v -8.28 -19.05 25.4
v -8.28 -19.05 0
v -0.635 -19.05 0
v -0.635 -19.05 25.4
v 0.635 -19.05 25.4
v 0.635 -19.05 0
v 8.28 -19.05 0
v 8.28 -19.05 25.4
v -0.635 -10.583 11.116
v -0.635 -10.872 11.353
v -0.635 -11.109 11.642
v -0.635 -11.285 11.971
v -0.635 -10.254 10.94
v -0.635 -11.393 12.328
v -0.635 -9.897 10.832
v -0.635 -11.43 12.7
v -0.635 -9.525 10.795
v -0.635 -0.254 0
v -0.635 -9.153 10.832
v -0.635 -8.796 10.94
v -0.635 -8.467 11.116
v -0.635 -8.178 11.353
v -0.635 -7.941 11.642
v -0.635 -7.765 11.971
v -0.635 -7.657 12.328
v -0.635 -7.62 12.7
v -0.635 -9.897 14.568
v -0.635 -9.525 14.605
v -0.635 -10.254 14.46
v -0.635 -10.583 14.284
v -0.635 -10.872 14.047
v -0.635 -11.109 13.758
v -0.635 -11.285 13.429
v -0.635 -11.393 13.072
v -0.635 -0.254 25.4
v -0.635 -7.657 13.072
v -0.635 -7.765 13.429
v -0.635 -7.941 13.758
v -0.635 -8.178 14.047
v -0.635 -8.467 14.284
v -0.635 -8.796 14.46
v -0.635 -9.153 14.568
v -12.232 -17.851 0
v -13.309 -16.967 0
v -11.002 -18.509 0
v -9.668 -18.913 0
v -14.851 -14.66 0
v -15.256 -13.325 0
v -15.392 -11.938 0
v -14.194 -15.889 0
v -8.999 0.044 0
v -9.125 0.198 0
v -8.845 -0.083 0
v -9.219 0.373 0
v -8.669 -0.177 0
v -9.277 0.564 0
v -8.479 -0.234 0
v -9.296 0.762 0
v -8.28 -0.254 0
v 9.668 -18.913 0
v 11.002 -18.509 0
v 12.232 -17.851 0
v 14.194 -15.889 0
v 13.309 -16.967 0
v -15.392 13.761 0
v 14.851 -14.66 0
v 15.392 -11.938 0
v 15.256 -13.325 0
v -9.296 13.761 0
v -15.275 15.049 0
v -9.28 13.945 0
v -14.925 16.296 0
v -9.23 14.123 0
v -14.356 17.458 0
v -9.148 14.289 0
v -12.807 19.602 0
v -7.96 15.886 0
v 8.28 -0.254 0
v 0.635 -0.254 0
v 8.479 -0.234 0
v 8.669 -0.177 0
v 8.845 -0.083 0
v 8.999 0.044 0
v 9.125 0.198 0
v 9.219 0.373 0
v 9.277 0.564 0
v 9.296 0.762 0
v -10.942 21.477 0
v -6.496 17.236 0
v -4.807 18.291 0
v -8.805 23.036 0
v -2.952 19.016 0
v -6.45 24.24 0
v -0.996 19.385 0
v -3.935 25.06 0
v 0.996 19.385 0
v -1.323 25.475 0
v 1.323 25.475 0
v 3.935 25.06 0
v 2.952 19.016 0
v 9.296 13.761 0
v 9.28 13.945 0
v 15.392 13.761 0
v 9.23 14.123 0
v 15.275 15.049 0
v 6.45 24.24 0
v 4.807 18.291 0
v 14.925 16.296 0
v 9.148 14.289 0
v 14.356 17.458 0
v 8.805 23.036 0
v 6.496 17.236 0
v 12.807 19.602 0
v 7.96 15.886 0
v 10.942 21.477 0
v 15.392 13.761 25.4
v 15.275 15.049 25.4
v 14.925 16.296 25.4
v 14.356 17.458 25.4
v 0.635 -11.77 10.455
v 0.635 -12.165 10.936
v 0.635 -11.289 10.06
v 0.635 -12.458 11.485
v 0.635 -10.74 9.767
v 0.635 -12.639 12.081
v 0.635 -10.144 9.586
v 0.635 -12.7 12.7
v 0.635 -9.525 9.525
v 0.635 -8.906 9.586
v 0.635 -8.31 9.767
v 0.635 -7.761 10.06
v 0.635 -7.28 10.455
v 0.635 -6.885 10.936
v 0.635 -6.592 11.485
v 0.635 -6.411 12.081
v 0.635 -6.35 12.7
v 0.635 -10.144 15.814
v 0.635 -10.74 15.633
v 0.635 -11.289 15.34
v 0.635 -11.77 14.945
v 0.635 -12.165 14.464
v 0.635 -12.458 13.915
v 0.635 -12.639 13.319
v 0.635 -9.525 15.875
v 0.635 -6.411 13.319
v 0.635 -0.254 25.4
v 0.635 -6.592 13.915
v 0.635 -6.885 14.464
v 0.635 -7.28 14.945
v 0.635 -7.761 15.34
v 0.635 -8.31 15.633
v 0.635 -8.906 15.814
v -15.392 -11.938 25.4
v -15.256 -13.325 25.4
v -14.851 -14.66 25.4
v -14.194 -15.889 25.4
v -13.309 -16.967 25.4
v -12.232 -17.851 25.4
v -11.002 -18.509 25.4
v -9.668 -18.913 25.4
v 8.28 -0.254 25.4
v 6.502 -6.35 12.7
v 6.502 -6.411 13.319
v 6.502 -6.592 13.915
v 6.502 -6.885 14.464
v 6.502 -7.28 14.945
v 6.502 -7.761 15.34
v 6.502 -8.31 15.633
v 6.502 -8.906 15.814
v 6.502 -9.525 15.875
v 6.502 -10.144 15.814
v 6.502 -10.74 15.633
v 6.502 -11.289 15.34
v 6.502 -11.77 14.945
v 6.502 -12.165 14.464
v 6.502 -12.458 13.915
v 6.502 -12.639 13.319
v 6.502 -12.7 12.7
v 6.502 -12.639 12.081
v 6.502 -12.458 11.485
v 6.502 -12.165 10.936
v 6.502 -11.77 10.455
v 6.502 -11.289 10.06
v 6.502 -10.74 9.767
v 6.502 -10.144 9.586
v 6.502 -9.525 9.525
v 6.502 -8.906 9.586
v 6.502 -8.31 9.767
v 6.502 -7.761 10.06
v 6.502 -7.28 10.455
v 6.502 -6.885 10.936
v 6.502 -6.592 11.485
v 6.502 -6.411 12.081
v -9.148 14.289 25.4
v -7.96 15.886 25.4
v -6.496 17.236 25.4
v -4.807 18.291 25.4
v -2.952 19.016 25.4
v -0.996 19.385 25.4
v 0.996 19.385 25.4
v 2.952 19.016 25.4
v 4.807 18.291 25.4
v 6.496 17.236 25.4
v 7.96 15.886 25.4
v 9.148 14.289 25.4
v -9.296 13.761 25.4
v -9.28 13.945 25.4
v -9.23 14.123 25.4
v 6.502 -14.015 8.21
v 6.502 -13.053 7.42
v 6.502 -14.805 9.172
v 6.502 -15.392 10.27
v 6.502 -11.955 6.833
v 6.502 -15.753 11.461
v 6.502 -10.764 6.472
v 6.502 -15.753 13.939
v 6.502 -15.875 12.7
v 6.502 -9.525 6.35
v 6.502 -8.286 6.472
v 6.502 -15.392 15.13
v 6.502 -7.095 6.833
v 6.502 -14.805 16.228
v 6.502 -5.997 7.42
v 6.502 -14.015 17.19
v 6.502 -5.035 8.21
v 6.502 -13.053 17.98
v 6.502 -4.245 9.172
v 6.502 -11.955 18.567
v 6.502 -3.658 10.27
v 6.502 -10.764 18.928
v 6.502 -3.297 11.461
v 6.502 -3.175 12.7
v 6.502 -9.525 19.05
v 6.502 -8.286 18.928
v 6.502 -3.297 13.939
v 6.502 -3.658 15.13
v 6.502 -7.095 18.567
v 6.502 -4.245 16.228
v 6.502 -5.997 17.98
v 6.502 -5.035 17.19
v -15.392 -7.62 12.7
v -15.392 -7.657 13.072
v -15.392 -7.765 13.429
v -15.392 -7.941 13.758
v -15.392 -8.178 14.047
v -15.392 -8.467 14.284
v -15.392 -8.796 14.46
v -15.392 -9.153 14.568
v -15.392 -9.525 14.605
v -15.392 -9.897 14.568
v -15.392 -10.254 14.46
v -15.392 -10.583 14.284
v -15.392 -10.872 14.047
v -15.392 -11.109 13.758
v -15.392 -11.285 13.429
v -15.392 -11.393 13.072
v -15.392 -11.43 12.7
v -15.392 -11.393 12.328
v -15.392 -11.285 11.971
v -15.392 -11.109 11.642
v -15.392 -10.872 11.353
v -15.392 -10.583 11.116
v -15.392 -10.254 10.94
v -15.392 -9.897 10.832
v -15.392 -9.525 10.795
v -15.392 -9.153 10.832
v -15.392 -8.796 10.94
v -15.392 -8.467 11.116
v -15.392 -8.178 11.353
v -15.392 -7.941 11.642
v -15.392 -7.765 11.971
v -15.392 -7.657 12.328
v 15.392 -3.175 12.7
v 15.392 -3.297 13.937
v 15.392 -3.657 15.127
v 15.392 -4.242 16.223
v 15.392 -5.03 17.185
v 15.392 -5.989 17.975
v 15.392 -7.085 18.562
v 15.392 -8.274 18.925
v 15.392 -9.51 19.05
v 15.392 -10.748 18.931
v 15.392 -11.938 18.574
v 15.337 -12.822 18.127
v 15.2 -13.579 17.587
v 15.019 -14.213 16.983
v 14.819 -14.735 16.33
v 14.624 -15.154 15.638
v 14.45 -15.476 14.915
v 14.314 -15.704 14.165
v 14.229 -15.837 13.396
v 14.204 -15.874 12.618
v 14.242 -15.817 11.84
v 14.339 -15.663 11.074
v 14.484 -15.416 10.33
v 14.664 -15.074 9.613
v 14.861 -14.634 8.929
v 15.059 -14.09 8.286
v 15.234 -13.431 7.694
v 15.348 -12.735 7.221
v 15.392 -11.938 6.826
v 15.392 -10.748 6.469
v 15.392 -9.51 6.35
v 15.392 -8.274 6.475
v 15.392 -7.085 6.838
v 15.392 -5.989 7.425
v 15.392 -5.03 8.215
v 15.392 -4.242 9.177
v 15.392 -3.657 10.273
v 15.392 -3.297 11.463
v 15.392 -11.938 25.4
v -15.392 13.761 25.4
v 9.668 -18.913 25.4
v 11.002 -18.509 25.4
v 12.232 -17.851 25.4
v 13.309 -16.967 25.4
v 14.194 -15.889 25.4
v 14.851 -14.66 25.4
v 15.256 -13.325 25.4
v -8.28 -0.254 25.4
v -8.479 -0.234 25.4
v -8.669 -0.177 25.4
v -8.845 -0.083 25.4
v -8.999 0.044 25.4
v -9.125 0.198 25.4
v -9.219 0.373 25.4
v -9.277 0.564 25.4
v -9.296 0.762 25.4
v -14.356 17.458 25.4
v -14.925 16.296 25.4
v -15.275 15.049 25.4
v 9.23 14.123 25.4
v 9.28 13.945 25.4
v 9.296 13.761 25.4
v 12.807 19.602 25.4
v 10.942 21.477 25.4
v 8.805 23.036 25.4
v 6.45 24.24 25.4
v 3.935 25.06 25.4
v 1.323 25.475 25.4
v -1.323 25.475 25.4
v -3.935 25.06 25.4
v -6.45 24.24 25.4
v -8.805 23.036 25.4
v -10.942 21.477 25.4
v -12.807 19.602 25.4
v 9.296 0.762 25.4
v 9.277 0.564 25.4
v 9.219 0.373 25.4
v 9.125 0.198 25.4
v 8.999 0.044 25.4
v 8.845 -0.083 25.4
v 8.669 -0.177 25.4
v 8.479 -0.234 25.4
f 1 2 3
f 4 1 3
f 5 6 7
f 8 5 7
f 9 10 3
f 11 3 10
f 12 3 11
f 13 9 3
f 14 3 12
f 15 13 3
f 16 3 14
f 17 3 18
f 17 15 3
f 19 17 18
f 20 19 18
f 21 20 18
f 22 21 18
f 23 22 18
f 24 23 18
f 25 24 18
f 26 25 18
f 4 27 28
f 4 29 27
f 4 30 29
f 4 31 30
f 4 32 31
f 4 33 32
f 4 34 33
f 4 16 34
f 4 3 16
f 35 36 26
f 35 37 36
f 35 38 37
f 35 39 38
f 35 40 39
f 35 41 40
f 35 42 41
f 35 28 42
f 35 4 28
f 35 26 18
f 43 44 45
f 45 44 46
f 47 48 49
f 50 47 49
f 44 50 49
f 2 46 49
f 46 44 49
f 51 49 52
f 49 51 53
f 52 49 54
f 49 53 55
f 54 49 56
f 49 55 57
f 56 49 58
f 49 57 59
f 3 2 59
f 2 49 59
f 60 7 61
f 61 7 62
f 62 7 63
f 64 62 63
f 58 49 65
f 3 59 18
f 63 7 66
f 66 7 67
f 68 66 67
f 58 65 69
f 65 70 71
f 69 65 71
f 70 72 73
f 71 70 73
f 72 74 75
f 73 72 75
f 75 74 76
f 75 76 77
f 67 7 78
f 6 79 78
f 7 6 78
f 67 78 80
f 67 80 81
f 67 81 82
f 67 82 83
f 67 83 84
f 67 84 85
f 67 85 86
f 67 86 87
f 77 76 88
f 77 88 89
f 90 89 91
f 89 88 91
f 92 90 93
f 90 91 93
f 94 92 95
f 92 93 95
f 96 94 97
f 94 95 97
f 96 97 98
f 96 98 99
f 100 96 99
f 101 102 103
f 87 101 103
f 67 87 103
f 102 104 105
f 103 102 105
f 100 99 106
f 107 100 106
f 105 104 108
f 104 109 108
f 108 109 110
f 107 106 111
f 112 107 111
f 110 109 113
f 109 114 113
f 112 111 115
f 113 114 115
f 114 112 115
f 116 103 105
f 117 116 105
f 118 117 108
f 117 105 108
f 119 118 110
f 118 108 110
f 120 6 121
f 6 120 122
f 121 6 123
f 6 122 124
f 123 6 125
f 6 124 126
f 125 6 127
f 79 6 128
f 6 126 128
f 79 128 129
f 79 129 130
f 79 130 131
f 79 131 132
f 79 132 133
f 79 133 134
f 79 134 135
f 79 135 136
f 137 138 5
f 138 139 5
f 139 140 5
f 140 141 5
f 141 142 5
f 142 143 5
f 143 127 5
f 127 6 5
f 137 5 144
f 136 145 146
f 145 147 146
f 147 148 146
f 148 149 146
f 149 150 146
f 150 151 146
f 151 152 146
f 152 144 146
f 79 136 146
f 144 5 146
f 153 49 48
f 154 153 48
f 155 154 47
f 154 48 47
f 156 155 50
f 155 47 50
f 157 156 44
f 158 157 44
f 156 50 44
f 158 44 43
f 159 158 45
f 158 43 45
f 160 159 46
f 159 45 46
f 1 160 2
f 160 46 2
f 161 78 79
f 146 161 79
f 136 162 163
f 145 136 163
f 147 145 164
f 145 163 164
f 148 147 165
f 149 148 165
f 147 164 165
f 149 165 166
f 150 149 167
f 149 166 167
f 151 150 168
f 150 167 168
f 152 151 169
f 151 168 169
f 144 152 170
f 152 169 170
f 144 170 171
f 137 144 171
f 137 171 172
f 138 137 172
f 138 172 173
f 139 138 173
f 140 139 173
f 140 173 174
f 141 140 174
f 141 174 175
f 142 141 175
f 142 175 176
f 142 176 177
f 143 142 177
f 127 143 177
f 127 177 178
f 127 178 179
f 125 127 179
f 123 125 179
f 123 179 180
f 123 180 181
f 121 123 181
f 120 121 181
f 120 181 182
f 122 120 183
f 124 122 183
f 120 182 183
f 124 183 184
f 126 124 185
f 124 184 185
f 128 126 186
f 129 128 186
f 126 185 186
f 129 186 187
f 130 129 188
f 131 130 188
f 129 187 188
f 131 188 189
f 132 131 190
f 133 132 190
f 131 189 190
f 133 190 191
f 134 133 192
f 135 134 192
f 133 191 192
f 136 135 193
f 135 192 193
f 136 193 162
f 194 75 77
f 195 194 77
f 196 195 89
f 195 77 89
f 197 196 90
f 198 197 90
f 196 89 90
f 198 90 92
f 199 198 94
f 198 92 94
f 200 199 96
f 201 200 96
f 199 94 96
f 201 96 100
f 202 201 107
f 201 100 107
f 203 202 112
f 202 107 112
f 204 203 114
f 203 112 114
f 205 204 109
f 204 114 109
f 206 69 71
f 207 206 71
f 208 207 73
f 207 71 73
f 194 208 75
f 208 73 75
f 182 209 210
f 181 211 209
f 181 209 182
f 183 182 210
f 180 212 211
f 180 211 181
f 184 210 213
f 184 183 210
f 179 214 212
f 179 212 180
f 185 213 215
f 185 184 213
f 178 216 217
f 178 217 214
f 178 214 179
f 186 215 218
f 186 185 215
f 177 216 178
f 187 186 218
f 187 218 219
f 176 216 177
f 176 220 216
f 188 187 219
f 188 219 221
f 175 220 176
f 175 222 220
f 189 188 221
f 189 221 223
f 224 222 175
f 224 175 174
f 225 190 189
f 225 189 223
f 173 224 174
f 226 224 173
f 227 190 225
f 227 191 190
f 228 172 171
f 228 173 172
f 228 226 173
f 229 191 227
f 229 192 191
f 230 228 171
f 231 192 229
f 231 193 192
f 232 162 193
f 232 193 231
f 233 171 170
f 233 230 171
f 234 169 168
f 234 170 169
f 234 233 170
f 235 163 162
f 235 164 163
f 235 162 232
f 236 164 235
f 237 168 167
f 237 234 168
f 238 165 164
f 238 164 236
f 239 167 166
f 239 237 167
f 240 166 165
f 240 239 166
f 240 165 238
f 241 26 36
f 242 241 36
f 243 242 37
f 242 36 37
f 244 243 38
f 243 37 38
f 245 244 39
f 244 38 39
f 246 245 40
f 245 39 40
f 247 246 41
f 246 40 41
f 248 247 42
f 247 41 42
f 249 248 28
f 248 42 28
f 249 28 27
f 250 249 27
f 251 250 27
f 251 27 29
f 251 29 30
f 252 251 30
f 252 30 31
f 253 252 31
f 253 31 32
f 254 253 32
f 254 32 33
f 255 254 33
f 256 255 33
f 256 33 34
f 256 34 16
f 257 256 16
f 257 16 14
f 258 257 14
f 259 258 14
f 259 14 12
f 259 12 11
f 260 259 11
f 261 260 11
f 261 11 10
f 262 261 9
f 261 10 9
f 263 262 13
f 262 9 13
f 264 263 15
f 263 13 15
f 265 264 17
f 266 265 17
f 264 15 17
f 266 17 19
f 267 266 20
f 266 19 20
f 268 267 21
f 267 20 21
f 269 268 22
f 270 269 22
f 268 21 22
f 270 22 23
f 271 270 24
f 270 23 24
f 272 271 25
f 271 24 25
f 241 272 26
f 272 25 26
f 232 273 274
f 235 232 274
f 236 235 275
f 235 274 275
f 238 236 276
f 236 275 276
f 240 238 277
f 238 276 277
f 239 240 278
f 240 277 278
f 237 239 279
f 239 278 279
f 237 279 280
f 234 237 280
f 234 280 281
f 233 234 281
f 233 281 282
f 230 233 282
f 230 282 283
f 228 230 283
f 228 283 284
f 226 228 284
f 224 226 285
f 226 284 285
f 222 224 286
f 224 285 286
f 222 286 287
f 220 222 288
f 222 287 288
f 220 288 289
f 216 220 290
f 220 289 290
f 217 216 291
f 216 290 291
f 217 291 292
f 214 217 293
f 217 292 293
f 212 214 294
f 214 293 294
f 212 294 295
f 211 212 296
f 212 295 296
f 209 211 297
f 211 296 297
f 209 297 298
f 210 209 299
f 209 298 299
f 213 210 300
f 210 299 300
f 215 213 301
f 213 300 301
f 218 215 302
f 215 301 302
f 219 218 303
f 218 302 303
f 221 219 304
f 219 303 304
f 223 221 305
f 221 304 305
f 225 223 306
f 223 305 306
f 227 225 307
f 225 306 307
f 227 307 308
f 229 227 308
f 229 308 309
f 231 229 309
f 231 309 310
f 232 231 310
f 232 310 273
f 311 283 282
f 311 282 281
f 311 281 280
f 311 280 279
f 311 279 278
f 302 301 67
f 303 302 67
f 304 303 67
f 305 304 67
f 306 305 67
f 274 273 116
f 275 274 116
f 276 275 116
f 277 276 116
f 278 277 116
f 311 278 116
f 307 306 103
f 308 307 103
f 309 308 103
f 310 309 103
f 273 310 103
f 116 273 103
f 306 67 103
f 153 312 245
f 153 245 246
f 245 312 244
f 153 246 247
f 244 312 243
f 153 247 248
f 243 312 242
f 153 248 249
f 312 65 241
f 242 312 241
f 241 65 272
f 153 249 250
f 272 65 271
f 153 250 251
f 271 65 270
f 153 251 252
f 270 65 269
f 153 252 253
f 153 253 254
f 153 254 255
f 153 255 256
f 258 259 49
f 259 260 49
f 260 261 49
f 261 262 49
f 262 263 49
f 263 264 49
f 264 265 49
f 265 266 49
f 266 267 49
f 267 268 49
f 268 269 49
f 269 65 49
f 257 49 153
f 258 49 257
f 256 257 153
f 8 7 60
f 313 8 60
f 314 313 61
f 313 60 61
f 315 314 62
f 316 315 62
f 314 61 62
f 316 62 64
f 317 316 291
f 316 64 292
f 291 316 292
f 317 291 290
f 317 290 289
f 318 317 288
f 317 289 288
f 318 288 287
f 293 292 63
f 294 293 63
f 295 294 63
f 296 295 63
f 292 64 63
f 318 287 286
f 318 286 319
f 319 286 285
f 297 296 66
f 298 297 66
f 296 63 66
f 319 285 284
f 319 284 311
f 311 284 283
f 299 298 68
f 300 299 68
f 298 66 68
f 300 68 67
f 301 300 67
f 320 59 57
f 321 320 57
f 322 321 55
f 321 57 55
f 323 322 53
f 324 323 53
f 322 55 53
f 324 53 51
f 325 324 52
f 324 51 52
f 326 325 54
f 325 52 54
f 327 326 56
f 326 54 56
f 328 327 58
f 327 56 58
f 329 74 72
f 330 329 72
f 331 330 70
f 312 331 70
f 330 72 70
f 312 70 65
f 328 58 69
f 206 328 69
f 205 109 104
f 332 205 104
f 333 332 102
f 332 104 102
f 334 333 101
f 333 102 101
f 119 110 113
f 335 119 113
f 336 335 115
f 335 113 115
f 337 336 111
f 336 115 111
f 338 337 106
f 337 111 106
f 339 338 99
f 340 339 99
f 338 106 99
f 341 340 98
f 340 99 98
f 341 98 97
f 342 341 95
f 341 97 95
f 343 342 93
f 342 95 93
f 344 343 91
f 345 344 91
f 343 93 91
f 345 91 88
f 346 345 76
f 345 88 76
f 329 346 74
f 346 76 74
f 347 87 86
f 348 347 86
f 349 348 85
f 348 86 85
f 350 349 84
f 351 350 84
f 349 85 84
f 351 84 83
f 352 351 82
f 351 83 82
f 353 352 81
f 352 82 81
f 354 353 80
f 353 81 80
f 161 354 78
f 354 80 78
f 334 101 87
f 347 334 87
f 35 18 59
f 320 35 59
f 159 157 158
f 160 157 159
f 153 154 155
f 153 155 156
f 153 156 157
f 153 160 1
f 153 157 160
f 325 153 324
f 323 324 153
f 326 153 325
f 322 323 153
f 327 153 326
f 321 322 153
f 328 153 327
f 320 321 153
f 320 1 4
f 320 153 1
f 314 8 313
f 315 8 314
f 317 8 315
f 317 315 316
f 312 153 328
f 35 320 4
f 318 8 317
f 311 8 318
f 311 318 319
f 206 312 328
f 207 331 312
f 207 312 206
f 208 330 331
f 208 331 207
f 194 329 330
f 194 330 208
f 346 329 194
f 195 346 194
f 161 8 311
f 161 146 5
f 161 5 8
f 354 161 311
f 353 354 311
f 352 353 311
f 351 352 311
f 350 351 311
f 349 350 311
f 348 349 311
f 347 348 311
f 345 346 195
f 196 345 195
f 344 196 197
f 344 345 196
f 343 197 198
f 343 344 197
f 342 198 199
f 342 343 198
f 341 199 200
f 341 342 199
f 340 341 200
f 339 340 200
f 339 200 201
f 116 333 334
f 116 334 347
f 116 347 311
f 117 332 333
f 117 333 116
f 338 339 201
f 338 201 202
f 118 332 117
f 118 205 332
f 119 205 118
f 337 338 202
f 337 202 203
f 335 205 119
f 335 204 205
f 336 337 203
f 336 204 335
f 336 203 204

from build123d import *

# Parameters (mm, degrees)
BOSS_EXTRUDE1_DEPTH = 25.4
SKETCH2_R           = 6.35
CUT_EXTRUDE1_DEPTH  = 8.89
SKETCH3_R           = 3.175
CUT_EXTRUDE2_DEPTH  = 6.35
SKETCH4_W           = 0.635
SKETCH4_H           = 18.796
CUT_EXTRUDE3_DEPTH  = 40.162657148
SKETCH5_R           = 1.905
CUT_EXTRUDE4_DEPTH  = 40.416561089


with BuildPart() as part:
    # Sketch1 → Boss-Extrude1 (new body)
    with BuildSketch(Plane.XY):
        with BuildLine():
            ThreePointArc((-14.355971037, 17.457748951), (-15.128392597, 15.680502137), (-15.3924, 13.760725746))
            Line((-15.3924, 13.760725746), (-15.3924, 0.762))
            Line((-15.3924, 0.762), (-15.3924, -11.938))
            ThreePointArc((-15.3924, -11.938), (-13.309343428, -16.966943428), (-8.2804, -19.05))
            Line((-8.2804, -19.05), (8.2804, -19.05))
            ThreePointArc((8.2804, -19.05), (13.309343428, -16.966943428), (15.3924, -11.938))
            Line((15.3924, -11.938), (15.3924, 0.762))
            Line((15.3924, 0.762), (15.3924, 13.760725746))
            ThreePointArc((15.3924, 13.760725746), (15.128392597, 15.680502137), (14.355971037, 17.457748951))
            ThreePointArc((14.355971037, 17.457748951), (0, 25.527), (-14.355971037, 17.457748951))
        make_face()
        with BuildLine():
            Line((-9.2964, 0.762), (-9.2964, 13.760725746))
            ThreePointArc((-9.2964, 13.760725746), (-9.258684657, 14.034979516), (-9.14833872, 14.288871918))
            ThreePointArc((-9.14833872, 14.288871918), (0, 19.431), (9.14833872, 14.288871918))
            ThreePointArc((9.14833872, 14.288871918), (9.258684657, 14.034979516), (9.2964, 13.760725746))
            Line((9.2964, 13.760725746), (9.2964, 0.762))
            ThreePointArc((9.2964, 0.762), (8.99882049, 0.04357951), (8.2804, -0.254))
            Line((8.2804, -0.254), (-8.2804, -0.254))
            ThreePointArc((-8.2804, -0.254), (-8.99882049, 0.04357951), (-9.2964, 0.762))
        make_face(mode=Mode.SUBTRACT)
    extrude(amount=BOSS_EXTRUDE1_DEPTH)

    # Sketch2 → Cut-Extrude1 (cut)
    with BuildSketch(Plane(origin=(15.3924, 0, 0), x_dir=(0, 0, -1), z_dir=(1, 0, 0))):
        with Locations(Location((-12.7, -9.525, 0), (0, 0, 90))):
            Circle(SKETCH2_R)
    extrude(amount=-CUT_EXTRUDE1_DEPTH, mode=Mode.SUBTRACT)

    # Sketch3 → Cut-Extrude2 (cut)
    with BuildSketch(Plane(origin=(6.5024, 0, 0), x_dir=(0, 0, -1), z_dir=(1, 0, 0))):
        with Locations(Location((-12.7, -9.525, 0), (0, 0, 90))):
            Circle(SKETCH3_R)
    extrude(amount=-CUT_EXTRUDE2_DEPTH, mode=Mode.SUBTRACT)

    # Sketch4 → Cut-Extrude3 (cut, through all)
    with BuildSketch(Plane.XY.offset(25.4)):
        with Locations((0.3175, -9.652)):
            Rectangle(SKETCH4_W, SKETCH4_H)
        with Locations((-0.3175, -9.652)):
            Rectangle(SKETCH4_W, SKETCH4_H)
    extrude(amount=-CUT_EXTRUDE3_DEPTH, mode=Mode.SUBTRACT)

    # Sketch5 → Cut-Extrude4 (cut, through all)
    with BuildSketch(Plane(origin=(-0.635, 0, 0), x_dir=(0, 0, -1), z_dir=(1, 0, 0))):
        with Locations(Location((-12.7, -9.525, 0), (0, 0, 90))):
            Circle(SKETCH5_R)
    extrude(amount=-CUT_EXTRUDE4_DEPTH, mode=Mode.SUBTRACT)


solid = part.part
